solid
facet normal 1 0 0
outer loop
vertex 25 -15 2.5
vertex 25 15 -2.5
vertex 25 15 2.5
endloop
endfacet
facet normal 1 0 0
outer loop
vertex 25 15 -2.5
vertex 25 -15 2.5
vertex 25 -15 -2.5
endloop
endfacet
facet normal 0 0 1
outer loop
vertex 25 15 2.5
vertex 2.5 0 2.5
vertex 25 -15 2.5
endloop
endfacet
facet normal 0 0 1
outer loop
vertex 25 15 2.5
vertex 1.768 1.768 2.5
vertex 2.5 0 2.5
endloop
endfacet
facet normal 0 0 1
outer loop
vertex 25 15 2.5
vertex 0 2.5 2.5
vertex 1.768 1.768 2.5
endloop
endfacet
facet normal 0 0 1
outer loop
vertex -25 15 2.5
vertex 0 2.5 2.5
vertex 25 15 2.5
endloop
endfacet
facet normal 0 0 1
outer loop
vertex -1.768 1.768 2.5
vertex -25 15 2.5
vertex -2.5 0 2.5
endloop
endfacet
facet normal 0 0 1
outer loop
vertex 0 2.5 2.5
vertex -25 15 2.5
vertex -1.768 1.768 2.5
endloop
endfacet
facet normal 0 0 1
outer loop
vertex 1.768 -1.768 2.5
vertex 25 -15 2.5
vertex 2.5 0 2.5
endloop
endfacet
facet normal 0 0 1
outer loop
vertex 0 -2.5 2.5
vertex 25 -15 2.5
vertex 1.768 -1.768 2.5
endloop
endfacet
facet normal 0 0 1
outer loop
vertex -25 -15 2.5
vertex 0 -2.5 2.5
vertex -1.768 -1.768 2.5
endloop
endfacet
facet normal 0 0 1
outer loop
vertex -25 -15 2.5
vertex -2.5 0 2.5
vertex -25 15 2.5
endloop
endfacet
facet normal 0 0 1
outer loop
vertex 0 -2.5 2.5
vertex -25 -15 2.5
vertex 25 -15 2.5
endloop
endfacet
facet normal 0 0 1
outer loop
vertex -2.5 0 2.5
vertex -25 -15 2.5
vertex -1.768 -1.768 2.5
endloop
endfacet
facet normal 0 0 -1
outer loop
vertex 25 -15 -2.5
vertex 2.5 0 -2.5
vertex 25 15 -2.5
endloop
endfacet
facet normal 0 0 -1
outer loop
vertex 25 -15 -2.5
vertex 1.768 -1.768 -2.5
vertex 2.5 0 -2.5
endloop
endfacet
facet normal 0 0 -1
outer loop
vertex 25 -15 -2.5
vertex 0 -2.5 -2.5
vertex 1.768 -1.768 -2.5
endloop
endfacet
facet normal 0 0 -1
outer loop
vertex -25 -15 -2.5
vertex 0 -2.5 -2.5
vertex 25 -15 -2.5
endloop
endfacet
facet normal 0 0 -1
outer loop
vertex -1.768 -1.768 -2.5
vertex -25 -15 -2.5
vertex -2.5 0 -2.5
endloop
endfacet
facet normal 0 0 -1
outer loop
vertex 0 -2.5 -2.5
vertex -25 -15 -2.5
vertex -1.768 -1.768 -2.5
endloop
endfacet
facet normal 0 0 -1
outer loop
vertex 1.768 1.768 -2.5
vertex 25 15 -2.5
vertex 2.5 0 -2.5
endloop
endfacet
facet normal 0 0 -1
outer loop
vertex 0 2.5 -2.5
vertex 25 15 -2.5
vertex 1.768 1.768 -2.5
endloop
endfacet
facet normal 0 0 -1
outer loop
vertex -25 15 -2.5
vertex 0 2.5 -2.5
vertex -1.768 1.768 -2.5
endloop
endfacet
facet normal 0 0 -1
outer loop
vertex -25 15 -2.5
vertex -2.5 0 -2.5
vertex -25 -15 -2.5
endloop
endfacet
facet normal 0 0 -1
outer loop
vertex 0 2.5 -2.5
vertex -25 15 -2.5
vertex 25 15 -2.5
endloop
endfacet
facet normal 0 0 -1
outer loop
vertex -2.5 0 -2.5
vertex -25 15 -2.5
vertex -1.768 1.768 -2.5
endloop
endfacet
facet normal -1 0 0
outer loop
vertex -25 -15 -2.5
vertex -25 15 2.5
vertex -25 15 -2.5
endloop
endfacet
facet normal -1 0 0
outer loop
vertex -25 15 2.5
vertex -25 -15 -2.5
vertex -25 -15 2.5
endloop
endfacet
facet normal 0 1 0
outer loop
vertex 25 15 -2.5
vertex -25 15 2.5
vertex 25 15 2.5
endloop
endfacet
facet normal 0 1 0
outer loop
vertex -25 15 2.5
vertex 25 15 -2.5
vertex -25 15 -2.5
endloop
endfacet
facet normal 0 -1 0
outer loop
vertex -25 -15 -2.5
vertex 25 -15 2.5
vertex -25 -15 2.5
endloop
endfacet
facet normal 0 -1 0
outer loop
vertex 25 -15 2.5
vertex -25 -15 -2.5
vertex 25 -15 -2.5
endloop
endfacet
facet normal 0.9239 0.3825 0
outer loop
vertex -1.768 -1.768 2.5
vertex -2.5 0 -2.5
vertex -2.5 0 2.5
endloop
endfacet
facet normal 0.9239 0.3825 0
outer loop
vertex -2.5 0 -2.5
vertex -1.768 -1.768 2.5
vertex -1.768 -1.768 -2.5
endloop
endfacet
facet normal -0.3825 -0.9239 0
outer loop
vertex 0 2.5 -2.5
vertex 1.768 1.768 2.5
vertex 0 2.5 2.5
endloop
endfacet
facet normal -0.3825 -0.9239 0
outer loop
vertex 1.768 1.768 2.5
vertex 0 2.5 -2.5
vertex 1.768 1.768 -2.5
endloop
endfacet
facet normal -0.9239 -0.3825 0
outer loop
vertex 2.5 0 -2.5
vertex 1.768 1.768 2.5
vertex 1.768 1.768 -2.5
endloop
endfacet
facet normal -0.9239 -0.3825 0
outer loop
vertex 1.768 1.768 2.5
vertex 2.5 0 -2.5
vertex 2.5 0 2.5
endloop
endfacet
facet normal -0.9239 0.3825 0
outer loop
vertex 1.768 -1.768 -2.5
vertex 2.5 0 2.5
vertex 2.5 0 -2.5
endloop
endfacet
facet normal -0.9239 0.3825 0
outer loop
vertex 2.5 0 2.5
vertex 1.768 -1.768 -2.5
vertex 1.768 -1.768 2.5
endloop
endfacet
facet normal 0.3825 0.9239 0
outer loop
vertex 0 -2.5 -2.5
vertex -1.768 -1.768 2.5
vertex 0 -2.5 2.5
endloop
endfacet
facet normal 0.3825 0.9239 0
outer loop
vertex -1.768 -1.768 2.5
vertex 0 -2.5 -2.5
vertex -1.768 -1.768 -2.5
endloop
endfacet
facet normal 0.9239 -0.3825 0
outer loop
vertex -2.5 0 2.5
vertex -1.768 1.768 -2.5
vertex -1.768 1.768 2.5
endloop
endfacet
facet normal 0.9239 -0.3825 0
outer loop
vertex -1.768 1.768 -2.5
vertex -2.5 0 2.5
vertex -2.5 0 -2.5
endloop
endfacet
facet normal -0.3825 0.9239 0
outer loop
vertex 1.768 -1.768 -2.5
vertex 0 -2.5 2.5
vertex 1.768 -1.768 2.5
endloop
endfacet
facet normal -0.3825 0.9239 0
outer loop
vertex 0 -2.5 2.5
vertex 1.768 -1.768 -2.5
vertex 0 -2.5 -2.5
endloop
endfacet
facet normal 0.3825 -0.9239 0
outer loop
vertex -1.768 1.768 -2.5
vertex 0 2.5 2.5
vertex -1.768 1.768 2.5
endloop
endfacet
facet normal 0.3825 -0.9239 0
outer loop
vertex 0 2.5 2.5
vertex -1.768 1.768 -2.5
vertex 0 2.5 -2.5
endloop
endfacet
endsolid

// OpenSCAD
// Parametric Bracket CAD script (Fallback Mock)
width = 50;
height = 30;
hole_diameter = 5;

difference() {
    cube([width, height, 5], center=true);
    cylinder(h=10, d=hole_diameter, center=true);
}
